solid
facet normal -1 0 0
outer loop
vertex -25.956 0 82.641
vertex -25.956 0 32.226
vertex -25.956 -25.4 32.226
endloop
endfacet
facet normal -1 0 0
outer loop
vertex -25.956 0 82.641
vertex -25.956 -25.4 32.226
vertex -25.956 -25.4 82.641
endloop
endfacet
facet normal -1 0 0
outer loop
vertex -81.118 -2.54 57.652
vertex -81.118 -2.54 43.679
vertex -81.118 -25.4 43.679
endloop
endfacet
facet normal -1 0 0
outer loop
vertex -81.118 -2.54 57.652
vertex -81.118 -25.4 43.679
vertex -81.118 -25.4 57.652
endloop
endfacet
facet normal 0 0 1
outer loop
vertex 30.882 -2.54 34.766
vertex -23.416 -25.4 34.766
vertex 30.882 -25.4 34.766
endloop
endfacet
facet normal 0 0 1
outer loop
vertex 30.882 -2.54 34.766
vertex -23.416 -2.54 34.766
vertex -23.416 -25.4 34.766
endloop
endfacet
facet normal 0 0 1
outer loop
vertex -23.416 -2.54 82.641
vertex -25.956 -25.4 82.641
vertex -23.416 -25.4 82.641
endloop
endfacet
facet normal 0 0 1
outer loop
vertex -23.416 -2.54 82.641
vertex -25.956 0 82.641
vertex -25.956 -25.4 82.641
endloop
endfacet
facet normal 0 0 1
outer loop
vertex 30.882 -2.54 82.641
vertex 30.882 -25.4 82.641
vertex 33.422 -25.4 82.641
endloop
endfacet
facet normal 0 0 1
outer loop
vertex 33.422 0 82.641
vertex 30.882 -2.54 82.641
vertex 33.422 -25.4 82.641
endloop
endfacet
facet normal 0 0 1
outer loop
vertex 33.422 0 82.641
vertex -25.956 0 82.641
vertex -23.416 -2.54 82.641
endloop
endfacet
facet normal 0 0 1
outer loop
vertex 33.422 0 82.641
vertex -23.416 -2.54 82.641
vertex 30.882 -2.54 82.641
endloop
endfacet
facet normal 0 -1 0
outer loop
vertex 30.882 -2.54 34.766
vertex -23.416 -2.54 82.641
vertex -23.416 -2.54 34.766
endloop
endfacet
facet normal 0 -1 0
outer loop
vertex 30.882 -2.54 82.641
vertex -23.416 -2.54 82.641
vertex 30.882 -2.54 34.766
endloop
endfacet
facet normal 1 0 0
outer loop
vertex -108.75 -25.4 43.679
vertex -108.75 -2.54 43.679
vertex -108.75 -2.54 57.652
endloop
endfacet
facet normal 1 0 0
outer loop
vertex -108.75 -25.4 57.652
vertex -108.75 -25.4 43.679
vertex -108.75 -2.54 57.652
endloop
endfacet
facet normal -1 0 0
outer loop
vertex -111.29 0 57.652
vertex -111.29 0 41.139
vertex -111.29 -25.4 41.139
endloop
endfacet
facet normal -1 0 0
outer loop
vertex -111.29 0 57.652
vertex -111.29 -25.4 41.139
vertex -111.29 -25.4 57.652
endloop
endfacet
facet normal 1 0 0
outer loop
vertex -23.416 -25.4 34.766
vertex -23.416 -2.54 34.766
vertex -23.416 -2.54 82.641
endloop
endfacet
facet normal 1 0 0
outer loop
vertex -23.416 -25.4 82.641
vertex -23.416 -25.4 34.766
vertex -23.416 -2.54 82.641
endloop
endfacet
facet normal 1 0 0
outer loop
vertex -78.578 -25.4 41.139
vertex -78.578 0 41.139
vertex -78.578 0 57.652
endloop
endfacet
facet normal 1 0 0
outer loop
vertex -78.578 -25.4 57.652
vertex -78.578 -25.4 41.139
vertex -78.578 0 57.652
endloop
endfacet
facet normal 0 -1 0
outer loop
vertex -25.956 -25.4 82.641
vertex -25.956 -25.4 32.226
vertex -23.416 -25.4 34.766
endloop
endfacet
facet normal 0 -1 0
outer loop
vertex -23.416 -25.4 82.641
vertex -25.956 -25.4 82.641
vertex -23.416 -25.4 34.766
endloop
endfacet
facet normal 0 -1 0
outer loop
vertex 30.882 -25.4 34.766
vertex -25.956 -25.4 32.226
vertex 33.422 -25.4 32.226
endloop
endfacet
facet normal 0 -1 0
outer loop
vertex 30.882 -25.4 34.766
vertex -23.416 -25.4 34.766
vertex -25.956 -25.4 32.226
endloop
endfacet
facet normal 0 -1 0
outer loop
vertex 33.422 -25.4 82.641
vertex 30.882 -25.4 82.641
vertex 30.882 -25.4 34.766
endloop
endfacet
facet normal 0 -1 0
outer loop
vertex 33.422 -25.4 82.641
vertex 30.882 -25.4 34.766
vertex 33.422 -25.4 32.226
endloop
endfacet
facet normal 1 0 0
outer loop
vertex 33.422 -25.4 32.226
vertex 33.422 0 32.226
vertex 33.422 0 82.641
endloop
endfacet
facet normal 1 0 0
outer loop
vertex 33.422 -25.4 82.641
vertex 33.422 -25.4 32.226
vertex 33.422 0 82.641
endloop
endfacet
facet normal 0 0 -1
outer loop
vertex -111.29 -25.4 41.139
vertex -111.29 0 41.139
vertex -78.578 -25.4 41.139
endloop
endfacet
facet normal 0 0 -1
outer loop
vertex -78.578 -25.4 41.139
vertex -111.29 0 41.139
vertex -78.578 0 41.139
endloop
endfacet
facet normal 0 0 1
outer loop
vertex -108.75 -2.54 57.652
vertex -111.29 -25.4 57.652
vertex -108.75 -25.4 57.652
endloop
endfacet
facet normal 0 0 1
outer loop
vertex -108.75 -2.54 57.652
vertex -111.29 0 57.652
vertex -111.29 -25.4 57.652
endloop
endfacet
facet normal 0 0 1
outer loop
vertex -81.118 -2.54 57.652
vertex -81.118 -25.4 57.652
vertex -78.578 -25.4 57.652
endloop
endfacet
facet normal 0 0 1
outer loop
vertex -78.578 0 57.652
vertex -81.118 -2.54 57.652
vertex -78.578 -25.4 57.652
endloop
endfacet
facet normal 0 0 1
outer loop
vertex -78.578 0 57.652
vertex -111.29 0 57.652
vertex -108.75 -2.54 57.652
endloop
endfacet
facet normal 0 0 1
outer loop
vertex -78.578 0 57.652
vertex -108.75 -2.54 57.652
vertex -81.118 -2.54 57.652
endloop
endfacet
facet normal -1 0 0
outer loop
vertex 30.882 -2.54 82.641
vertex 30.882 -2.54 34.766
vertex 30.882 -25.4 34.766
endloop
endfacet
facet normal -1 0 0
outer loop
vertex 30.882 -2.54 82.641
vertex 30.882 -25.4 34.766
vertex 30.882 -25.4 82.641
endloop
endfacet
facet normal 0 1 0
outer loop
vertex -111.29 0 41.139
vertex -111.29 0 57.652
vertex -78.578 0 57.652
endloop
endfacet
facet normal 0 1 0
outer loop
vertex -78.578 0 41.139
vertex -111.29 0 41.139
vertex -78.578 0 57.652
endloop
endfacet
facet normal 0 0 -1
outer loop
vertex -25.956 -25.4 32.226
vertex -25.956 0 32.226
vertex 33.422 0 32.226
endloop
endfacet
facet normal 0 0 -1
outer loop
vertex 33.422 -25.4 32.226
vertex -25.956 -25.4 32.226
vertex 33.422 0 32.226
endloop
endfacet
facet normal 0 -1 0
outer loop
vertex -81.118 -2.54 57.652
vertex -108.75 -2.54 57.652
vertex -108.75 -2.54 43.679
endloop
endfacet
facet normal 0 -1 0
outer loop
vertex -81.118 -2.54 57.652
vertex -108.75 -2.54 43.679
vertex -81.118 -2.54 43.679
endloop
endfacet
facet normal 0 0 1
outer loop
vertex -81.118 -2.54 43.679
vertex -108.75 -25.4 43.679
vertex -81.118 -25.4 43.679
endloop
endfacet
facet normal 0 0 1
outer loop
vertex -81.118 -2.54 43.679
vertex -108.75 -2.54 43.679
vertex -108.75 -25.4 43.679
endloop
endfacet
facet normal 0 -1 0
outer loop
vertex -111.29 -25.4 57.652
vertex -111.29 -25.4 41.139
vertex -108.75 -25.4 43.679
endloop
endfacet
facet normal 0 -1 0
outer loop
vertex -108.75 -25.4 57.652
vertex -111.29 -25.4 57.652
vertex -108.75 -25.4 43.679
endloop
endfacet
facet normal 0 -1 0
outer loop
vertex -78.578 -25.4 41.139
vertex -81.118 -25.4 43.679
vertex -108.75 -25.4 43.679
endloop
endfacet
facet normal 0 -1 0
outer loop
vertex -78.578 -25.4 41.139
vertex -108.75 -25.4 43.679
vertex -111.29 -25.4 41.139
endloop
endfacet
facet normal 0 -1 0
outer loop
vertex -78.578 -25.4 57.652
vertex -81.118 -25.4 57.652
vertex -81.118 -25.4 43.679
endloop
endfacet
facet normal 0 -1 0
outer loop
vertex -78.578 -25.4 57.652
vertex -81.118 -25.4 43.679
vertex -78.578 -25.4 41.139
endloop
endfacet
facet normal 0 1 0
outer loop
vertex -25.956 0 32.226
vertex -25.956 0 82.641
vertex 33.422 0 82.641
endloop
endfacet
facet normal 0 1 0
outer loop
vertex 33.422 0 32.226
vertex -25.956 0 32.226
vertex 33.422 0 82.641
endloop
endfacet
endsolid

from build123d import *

# Parameters (mm, degrees)
F0_W     = 32.7112972736
F0_H     = 16.5127553046
F1_DEPTH = 25.4
F0_W_2   = 59.3781042844
F0_H_2   = 50.4149533808
F2_T     = -2.54
F2_2_T   = -2.54


with BuildPart() as f1:
    # F0 (on Front) → F1 (new body)
    with BuildSketch(Plane.XZ):
        with Locations((-94.9338600039, 49.3953768164)):
            Rectangle(F0_W, F0_H)
    extrude(amount=F1_DEPTH)

    # F2
    f2_openings = [f1.faces().sort_by_distance(p)[0] for p in [
        (-94.93386, -12.7, 57.651754),
        (-94.93386, -25.4, 49.395377),
    ]]
    offset(amount=F2_T, openings=f2_openings)


with BuildPart() as f1b:
    # F0 (on Front) → F1, piece 2 (new body)
    with BuildSketch(Plane.XZ):
        with Locations((3.7333546206, 57.4335958809)):
            Rectangle(F0_W_2, F0_H_2)
    extrude(amount=F1_DEPTH)

    # F2#2
    f2_2_openings = [f1b.faces().sort_by_distance(p)[0] for p in [
        (3.733355, -25.4, 57.433596),
        (3.733355, -12.7, 82.641073),
    ]]
    offset(amount=F2_2_T, openings=f2_2_openings)


solid = Compound([f1.part, f1b.part])
